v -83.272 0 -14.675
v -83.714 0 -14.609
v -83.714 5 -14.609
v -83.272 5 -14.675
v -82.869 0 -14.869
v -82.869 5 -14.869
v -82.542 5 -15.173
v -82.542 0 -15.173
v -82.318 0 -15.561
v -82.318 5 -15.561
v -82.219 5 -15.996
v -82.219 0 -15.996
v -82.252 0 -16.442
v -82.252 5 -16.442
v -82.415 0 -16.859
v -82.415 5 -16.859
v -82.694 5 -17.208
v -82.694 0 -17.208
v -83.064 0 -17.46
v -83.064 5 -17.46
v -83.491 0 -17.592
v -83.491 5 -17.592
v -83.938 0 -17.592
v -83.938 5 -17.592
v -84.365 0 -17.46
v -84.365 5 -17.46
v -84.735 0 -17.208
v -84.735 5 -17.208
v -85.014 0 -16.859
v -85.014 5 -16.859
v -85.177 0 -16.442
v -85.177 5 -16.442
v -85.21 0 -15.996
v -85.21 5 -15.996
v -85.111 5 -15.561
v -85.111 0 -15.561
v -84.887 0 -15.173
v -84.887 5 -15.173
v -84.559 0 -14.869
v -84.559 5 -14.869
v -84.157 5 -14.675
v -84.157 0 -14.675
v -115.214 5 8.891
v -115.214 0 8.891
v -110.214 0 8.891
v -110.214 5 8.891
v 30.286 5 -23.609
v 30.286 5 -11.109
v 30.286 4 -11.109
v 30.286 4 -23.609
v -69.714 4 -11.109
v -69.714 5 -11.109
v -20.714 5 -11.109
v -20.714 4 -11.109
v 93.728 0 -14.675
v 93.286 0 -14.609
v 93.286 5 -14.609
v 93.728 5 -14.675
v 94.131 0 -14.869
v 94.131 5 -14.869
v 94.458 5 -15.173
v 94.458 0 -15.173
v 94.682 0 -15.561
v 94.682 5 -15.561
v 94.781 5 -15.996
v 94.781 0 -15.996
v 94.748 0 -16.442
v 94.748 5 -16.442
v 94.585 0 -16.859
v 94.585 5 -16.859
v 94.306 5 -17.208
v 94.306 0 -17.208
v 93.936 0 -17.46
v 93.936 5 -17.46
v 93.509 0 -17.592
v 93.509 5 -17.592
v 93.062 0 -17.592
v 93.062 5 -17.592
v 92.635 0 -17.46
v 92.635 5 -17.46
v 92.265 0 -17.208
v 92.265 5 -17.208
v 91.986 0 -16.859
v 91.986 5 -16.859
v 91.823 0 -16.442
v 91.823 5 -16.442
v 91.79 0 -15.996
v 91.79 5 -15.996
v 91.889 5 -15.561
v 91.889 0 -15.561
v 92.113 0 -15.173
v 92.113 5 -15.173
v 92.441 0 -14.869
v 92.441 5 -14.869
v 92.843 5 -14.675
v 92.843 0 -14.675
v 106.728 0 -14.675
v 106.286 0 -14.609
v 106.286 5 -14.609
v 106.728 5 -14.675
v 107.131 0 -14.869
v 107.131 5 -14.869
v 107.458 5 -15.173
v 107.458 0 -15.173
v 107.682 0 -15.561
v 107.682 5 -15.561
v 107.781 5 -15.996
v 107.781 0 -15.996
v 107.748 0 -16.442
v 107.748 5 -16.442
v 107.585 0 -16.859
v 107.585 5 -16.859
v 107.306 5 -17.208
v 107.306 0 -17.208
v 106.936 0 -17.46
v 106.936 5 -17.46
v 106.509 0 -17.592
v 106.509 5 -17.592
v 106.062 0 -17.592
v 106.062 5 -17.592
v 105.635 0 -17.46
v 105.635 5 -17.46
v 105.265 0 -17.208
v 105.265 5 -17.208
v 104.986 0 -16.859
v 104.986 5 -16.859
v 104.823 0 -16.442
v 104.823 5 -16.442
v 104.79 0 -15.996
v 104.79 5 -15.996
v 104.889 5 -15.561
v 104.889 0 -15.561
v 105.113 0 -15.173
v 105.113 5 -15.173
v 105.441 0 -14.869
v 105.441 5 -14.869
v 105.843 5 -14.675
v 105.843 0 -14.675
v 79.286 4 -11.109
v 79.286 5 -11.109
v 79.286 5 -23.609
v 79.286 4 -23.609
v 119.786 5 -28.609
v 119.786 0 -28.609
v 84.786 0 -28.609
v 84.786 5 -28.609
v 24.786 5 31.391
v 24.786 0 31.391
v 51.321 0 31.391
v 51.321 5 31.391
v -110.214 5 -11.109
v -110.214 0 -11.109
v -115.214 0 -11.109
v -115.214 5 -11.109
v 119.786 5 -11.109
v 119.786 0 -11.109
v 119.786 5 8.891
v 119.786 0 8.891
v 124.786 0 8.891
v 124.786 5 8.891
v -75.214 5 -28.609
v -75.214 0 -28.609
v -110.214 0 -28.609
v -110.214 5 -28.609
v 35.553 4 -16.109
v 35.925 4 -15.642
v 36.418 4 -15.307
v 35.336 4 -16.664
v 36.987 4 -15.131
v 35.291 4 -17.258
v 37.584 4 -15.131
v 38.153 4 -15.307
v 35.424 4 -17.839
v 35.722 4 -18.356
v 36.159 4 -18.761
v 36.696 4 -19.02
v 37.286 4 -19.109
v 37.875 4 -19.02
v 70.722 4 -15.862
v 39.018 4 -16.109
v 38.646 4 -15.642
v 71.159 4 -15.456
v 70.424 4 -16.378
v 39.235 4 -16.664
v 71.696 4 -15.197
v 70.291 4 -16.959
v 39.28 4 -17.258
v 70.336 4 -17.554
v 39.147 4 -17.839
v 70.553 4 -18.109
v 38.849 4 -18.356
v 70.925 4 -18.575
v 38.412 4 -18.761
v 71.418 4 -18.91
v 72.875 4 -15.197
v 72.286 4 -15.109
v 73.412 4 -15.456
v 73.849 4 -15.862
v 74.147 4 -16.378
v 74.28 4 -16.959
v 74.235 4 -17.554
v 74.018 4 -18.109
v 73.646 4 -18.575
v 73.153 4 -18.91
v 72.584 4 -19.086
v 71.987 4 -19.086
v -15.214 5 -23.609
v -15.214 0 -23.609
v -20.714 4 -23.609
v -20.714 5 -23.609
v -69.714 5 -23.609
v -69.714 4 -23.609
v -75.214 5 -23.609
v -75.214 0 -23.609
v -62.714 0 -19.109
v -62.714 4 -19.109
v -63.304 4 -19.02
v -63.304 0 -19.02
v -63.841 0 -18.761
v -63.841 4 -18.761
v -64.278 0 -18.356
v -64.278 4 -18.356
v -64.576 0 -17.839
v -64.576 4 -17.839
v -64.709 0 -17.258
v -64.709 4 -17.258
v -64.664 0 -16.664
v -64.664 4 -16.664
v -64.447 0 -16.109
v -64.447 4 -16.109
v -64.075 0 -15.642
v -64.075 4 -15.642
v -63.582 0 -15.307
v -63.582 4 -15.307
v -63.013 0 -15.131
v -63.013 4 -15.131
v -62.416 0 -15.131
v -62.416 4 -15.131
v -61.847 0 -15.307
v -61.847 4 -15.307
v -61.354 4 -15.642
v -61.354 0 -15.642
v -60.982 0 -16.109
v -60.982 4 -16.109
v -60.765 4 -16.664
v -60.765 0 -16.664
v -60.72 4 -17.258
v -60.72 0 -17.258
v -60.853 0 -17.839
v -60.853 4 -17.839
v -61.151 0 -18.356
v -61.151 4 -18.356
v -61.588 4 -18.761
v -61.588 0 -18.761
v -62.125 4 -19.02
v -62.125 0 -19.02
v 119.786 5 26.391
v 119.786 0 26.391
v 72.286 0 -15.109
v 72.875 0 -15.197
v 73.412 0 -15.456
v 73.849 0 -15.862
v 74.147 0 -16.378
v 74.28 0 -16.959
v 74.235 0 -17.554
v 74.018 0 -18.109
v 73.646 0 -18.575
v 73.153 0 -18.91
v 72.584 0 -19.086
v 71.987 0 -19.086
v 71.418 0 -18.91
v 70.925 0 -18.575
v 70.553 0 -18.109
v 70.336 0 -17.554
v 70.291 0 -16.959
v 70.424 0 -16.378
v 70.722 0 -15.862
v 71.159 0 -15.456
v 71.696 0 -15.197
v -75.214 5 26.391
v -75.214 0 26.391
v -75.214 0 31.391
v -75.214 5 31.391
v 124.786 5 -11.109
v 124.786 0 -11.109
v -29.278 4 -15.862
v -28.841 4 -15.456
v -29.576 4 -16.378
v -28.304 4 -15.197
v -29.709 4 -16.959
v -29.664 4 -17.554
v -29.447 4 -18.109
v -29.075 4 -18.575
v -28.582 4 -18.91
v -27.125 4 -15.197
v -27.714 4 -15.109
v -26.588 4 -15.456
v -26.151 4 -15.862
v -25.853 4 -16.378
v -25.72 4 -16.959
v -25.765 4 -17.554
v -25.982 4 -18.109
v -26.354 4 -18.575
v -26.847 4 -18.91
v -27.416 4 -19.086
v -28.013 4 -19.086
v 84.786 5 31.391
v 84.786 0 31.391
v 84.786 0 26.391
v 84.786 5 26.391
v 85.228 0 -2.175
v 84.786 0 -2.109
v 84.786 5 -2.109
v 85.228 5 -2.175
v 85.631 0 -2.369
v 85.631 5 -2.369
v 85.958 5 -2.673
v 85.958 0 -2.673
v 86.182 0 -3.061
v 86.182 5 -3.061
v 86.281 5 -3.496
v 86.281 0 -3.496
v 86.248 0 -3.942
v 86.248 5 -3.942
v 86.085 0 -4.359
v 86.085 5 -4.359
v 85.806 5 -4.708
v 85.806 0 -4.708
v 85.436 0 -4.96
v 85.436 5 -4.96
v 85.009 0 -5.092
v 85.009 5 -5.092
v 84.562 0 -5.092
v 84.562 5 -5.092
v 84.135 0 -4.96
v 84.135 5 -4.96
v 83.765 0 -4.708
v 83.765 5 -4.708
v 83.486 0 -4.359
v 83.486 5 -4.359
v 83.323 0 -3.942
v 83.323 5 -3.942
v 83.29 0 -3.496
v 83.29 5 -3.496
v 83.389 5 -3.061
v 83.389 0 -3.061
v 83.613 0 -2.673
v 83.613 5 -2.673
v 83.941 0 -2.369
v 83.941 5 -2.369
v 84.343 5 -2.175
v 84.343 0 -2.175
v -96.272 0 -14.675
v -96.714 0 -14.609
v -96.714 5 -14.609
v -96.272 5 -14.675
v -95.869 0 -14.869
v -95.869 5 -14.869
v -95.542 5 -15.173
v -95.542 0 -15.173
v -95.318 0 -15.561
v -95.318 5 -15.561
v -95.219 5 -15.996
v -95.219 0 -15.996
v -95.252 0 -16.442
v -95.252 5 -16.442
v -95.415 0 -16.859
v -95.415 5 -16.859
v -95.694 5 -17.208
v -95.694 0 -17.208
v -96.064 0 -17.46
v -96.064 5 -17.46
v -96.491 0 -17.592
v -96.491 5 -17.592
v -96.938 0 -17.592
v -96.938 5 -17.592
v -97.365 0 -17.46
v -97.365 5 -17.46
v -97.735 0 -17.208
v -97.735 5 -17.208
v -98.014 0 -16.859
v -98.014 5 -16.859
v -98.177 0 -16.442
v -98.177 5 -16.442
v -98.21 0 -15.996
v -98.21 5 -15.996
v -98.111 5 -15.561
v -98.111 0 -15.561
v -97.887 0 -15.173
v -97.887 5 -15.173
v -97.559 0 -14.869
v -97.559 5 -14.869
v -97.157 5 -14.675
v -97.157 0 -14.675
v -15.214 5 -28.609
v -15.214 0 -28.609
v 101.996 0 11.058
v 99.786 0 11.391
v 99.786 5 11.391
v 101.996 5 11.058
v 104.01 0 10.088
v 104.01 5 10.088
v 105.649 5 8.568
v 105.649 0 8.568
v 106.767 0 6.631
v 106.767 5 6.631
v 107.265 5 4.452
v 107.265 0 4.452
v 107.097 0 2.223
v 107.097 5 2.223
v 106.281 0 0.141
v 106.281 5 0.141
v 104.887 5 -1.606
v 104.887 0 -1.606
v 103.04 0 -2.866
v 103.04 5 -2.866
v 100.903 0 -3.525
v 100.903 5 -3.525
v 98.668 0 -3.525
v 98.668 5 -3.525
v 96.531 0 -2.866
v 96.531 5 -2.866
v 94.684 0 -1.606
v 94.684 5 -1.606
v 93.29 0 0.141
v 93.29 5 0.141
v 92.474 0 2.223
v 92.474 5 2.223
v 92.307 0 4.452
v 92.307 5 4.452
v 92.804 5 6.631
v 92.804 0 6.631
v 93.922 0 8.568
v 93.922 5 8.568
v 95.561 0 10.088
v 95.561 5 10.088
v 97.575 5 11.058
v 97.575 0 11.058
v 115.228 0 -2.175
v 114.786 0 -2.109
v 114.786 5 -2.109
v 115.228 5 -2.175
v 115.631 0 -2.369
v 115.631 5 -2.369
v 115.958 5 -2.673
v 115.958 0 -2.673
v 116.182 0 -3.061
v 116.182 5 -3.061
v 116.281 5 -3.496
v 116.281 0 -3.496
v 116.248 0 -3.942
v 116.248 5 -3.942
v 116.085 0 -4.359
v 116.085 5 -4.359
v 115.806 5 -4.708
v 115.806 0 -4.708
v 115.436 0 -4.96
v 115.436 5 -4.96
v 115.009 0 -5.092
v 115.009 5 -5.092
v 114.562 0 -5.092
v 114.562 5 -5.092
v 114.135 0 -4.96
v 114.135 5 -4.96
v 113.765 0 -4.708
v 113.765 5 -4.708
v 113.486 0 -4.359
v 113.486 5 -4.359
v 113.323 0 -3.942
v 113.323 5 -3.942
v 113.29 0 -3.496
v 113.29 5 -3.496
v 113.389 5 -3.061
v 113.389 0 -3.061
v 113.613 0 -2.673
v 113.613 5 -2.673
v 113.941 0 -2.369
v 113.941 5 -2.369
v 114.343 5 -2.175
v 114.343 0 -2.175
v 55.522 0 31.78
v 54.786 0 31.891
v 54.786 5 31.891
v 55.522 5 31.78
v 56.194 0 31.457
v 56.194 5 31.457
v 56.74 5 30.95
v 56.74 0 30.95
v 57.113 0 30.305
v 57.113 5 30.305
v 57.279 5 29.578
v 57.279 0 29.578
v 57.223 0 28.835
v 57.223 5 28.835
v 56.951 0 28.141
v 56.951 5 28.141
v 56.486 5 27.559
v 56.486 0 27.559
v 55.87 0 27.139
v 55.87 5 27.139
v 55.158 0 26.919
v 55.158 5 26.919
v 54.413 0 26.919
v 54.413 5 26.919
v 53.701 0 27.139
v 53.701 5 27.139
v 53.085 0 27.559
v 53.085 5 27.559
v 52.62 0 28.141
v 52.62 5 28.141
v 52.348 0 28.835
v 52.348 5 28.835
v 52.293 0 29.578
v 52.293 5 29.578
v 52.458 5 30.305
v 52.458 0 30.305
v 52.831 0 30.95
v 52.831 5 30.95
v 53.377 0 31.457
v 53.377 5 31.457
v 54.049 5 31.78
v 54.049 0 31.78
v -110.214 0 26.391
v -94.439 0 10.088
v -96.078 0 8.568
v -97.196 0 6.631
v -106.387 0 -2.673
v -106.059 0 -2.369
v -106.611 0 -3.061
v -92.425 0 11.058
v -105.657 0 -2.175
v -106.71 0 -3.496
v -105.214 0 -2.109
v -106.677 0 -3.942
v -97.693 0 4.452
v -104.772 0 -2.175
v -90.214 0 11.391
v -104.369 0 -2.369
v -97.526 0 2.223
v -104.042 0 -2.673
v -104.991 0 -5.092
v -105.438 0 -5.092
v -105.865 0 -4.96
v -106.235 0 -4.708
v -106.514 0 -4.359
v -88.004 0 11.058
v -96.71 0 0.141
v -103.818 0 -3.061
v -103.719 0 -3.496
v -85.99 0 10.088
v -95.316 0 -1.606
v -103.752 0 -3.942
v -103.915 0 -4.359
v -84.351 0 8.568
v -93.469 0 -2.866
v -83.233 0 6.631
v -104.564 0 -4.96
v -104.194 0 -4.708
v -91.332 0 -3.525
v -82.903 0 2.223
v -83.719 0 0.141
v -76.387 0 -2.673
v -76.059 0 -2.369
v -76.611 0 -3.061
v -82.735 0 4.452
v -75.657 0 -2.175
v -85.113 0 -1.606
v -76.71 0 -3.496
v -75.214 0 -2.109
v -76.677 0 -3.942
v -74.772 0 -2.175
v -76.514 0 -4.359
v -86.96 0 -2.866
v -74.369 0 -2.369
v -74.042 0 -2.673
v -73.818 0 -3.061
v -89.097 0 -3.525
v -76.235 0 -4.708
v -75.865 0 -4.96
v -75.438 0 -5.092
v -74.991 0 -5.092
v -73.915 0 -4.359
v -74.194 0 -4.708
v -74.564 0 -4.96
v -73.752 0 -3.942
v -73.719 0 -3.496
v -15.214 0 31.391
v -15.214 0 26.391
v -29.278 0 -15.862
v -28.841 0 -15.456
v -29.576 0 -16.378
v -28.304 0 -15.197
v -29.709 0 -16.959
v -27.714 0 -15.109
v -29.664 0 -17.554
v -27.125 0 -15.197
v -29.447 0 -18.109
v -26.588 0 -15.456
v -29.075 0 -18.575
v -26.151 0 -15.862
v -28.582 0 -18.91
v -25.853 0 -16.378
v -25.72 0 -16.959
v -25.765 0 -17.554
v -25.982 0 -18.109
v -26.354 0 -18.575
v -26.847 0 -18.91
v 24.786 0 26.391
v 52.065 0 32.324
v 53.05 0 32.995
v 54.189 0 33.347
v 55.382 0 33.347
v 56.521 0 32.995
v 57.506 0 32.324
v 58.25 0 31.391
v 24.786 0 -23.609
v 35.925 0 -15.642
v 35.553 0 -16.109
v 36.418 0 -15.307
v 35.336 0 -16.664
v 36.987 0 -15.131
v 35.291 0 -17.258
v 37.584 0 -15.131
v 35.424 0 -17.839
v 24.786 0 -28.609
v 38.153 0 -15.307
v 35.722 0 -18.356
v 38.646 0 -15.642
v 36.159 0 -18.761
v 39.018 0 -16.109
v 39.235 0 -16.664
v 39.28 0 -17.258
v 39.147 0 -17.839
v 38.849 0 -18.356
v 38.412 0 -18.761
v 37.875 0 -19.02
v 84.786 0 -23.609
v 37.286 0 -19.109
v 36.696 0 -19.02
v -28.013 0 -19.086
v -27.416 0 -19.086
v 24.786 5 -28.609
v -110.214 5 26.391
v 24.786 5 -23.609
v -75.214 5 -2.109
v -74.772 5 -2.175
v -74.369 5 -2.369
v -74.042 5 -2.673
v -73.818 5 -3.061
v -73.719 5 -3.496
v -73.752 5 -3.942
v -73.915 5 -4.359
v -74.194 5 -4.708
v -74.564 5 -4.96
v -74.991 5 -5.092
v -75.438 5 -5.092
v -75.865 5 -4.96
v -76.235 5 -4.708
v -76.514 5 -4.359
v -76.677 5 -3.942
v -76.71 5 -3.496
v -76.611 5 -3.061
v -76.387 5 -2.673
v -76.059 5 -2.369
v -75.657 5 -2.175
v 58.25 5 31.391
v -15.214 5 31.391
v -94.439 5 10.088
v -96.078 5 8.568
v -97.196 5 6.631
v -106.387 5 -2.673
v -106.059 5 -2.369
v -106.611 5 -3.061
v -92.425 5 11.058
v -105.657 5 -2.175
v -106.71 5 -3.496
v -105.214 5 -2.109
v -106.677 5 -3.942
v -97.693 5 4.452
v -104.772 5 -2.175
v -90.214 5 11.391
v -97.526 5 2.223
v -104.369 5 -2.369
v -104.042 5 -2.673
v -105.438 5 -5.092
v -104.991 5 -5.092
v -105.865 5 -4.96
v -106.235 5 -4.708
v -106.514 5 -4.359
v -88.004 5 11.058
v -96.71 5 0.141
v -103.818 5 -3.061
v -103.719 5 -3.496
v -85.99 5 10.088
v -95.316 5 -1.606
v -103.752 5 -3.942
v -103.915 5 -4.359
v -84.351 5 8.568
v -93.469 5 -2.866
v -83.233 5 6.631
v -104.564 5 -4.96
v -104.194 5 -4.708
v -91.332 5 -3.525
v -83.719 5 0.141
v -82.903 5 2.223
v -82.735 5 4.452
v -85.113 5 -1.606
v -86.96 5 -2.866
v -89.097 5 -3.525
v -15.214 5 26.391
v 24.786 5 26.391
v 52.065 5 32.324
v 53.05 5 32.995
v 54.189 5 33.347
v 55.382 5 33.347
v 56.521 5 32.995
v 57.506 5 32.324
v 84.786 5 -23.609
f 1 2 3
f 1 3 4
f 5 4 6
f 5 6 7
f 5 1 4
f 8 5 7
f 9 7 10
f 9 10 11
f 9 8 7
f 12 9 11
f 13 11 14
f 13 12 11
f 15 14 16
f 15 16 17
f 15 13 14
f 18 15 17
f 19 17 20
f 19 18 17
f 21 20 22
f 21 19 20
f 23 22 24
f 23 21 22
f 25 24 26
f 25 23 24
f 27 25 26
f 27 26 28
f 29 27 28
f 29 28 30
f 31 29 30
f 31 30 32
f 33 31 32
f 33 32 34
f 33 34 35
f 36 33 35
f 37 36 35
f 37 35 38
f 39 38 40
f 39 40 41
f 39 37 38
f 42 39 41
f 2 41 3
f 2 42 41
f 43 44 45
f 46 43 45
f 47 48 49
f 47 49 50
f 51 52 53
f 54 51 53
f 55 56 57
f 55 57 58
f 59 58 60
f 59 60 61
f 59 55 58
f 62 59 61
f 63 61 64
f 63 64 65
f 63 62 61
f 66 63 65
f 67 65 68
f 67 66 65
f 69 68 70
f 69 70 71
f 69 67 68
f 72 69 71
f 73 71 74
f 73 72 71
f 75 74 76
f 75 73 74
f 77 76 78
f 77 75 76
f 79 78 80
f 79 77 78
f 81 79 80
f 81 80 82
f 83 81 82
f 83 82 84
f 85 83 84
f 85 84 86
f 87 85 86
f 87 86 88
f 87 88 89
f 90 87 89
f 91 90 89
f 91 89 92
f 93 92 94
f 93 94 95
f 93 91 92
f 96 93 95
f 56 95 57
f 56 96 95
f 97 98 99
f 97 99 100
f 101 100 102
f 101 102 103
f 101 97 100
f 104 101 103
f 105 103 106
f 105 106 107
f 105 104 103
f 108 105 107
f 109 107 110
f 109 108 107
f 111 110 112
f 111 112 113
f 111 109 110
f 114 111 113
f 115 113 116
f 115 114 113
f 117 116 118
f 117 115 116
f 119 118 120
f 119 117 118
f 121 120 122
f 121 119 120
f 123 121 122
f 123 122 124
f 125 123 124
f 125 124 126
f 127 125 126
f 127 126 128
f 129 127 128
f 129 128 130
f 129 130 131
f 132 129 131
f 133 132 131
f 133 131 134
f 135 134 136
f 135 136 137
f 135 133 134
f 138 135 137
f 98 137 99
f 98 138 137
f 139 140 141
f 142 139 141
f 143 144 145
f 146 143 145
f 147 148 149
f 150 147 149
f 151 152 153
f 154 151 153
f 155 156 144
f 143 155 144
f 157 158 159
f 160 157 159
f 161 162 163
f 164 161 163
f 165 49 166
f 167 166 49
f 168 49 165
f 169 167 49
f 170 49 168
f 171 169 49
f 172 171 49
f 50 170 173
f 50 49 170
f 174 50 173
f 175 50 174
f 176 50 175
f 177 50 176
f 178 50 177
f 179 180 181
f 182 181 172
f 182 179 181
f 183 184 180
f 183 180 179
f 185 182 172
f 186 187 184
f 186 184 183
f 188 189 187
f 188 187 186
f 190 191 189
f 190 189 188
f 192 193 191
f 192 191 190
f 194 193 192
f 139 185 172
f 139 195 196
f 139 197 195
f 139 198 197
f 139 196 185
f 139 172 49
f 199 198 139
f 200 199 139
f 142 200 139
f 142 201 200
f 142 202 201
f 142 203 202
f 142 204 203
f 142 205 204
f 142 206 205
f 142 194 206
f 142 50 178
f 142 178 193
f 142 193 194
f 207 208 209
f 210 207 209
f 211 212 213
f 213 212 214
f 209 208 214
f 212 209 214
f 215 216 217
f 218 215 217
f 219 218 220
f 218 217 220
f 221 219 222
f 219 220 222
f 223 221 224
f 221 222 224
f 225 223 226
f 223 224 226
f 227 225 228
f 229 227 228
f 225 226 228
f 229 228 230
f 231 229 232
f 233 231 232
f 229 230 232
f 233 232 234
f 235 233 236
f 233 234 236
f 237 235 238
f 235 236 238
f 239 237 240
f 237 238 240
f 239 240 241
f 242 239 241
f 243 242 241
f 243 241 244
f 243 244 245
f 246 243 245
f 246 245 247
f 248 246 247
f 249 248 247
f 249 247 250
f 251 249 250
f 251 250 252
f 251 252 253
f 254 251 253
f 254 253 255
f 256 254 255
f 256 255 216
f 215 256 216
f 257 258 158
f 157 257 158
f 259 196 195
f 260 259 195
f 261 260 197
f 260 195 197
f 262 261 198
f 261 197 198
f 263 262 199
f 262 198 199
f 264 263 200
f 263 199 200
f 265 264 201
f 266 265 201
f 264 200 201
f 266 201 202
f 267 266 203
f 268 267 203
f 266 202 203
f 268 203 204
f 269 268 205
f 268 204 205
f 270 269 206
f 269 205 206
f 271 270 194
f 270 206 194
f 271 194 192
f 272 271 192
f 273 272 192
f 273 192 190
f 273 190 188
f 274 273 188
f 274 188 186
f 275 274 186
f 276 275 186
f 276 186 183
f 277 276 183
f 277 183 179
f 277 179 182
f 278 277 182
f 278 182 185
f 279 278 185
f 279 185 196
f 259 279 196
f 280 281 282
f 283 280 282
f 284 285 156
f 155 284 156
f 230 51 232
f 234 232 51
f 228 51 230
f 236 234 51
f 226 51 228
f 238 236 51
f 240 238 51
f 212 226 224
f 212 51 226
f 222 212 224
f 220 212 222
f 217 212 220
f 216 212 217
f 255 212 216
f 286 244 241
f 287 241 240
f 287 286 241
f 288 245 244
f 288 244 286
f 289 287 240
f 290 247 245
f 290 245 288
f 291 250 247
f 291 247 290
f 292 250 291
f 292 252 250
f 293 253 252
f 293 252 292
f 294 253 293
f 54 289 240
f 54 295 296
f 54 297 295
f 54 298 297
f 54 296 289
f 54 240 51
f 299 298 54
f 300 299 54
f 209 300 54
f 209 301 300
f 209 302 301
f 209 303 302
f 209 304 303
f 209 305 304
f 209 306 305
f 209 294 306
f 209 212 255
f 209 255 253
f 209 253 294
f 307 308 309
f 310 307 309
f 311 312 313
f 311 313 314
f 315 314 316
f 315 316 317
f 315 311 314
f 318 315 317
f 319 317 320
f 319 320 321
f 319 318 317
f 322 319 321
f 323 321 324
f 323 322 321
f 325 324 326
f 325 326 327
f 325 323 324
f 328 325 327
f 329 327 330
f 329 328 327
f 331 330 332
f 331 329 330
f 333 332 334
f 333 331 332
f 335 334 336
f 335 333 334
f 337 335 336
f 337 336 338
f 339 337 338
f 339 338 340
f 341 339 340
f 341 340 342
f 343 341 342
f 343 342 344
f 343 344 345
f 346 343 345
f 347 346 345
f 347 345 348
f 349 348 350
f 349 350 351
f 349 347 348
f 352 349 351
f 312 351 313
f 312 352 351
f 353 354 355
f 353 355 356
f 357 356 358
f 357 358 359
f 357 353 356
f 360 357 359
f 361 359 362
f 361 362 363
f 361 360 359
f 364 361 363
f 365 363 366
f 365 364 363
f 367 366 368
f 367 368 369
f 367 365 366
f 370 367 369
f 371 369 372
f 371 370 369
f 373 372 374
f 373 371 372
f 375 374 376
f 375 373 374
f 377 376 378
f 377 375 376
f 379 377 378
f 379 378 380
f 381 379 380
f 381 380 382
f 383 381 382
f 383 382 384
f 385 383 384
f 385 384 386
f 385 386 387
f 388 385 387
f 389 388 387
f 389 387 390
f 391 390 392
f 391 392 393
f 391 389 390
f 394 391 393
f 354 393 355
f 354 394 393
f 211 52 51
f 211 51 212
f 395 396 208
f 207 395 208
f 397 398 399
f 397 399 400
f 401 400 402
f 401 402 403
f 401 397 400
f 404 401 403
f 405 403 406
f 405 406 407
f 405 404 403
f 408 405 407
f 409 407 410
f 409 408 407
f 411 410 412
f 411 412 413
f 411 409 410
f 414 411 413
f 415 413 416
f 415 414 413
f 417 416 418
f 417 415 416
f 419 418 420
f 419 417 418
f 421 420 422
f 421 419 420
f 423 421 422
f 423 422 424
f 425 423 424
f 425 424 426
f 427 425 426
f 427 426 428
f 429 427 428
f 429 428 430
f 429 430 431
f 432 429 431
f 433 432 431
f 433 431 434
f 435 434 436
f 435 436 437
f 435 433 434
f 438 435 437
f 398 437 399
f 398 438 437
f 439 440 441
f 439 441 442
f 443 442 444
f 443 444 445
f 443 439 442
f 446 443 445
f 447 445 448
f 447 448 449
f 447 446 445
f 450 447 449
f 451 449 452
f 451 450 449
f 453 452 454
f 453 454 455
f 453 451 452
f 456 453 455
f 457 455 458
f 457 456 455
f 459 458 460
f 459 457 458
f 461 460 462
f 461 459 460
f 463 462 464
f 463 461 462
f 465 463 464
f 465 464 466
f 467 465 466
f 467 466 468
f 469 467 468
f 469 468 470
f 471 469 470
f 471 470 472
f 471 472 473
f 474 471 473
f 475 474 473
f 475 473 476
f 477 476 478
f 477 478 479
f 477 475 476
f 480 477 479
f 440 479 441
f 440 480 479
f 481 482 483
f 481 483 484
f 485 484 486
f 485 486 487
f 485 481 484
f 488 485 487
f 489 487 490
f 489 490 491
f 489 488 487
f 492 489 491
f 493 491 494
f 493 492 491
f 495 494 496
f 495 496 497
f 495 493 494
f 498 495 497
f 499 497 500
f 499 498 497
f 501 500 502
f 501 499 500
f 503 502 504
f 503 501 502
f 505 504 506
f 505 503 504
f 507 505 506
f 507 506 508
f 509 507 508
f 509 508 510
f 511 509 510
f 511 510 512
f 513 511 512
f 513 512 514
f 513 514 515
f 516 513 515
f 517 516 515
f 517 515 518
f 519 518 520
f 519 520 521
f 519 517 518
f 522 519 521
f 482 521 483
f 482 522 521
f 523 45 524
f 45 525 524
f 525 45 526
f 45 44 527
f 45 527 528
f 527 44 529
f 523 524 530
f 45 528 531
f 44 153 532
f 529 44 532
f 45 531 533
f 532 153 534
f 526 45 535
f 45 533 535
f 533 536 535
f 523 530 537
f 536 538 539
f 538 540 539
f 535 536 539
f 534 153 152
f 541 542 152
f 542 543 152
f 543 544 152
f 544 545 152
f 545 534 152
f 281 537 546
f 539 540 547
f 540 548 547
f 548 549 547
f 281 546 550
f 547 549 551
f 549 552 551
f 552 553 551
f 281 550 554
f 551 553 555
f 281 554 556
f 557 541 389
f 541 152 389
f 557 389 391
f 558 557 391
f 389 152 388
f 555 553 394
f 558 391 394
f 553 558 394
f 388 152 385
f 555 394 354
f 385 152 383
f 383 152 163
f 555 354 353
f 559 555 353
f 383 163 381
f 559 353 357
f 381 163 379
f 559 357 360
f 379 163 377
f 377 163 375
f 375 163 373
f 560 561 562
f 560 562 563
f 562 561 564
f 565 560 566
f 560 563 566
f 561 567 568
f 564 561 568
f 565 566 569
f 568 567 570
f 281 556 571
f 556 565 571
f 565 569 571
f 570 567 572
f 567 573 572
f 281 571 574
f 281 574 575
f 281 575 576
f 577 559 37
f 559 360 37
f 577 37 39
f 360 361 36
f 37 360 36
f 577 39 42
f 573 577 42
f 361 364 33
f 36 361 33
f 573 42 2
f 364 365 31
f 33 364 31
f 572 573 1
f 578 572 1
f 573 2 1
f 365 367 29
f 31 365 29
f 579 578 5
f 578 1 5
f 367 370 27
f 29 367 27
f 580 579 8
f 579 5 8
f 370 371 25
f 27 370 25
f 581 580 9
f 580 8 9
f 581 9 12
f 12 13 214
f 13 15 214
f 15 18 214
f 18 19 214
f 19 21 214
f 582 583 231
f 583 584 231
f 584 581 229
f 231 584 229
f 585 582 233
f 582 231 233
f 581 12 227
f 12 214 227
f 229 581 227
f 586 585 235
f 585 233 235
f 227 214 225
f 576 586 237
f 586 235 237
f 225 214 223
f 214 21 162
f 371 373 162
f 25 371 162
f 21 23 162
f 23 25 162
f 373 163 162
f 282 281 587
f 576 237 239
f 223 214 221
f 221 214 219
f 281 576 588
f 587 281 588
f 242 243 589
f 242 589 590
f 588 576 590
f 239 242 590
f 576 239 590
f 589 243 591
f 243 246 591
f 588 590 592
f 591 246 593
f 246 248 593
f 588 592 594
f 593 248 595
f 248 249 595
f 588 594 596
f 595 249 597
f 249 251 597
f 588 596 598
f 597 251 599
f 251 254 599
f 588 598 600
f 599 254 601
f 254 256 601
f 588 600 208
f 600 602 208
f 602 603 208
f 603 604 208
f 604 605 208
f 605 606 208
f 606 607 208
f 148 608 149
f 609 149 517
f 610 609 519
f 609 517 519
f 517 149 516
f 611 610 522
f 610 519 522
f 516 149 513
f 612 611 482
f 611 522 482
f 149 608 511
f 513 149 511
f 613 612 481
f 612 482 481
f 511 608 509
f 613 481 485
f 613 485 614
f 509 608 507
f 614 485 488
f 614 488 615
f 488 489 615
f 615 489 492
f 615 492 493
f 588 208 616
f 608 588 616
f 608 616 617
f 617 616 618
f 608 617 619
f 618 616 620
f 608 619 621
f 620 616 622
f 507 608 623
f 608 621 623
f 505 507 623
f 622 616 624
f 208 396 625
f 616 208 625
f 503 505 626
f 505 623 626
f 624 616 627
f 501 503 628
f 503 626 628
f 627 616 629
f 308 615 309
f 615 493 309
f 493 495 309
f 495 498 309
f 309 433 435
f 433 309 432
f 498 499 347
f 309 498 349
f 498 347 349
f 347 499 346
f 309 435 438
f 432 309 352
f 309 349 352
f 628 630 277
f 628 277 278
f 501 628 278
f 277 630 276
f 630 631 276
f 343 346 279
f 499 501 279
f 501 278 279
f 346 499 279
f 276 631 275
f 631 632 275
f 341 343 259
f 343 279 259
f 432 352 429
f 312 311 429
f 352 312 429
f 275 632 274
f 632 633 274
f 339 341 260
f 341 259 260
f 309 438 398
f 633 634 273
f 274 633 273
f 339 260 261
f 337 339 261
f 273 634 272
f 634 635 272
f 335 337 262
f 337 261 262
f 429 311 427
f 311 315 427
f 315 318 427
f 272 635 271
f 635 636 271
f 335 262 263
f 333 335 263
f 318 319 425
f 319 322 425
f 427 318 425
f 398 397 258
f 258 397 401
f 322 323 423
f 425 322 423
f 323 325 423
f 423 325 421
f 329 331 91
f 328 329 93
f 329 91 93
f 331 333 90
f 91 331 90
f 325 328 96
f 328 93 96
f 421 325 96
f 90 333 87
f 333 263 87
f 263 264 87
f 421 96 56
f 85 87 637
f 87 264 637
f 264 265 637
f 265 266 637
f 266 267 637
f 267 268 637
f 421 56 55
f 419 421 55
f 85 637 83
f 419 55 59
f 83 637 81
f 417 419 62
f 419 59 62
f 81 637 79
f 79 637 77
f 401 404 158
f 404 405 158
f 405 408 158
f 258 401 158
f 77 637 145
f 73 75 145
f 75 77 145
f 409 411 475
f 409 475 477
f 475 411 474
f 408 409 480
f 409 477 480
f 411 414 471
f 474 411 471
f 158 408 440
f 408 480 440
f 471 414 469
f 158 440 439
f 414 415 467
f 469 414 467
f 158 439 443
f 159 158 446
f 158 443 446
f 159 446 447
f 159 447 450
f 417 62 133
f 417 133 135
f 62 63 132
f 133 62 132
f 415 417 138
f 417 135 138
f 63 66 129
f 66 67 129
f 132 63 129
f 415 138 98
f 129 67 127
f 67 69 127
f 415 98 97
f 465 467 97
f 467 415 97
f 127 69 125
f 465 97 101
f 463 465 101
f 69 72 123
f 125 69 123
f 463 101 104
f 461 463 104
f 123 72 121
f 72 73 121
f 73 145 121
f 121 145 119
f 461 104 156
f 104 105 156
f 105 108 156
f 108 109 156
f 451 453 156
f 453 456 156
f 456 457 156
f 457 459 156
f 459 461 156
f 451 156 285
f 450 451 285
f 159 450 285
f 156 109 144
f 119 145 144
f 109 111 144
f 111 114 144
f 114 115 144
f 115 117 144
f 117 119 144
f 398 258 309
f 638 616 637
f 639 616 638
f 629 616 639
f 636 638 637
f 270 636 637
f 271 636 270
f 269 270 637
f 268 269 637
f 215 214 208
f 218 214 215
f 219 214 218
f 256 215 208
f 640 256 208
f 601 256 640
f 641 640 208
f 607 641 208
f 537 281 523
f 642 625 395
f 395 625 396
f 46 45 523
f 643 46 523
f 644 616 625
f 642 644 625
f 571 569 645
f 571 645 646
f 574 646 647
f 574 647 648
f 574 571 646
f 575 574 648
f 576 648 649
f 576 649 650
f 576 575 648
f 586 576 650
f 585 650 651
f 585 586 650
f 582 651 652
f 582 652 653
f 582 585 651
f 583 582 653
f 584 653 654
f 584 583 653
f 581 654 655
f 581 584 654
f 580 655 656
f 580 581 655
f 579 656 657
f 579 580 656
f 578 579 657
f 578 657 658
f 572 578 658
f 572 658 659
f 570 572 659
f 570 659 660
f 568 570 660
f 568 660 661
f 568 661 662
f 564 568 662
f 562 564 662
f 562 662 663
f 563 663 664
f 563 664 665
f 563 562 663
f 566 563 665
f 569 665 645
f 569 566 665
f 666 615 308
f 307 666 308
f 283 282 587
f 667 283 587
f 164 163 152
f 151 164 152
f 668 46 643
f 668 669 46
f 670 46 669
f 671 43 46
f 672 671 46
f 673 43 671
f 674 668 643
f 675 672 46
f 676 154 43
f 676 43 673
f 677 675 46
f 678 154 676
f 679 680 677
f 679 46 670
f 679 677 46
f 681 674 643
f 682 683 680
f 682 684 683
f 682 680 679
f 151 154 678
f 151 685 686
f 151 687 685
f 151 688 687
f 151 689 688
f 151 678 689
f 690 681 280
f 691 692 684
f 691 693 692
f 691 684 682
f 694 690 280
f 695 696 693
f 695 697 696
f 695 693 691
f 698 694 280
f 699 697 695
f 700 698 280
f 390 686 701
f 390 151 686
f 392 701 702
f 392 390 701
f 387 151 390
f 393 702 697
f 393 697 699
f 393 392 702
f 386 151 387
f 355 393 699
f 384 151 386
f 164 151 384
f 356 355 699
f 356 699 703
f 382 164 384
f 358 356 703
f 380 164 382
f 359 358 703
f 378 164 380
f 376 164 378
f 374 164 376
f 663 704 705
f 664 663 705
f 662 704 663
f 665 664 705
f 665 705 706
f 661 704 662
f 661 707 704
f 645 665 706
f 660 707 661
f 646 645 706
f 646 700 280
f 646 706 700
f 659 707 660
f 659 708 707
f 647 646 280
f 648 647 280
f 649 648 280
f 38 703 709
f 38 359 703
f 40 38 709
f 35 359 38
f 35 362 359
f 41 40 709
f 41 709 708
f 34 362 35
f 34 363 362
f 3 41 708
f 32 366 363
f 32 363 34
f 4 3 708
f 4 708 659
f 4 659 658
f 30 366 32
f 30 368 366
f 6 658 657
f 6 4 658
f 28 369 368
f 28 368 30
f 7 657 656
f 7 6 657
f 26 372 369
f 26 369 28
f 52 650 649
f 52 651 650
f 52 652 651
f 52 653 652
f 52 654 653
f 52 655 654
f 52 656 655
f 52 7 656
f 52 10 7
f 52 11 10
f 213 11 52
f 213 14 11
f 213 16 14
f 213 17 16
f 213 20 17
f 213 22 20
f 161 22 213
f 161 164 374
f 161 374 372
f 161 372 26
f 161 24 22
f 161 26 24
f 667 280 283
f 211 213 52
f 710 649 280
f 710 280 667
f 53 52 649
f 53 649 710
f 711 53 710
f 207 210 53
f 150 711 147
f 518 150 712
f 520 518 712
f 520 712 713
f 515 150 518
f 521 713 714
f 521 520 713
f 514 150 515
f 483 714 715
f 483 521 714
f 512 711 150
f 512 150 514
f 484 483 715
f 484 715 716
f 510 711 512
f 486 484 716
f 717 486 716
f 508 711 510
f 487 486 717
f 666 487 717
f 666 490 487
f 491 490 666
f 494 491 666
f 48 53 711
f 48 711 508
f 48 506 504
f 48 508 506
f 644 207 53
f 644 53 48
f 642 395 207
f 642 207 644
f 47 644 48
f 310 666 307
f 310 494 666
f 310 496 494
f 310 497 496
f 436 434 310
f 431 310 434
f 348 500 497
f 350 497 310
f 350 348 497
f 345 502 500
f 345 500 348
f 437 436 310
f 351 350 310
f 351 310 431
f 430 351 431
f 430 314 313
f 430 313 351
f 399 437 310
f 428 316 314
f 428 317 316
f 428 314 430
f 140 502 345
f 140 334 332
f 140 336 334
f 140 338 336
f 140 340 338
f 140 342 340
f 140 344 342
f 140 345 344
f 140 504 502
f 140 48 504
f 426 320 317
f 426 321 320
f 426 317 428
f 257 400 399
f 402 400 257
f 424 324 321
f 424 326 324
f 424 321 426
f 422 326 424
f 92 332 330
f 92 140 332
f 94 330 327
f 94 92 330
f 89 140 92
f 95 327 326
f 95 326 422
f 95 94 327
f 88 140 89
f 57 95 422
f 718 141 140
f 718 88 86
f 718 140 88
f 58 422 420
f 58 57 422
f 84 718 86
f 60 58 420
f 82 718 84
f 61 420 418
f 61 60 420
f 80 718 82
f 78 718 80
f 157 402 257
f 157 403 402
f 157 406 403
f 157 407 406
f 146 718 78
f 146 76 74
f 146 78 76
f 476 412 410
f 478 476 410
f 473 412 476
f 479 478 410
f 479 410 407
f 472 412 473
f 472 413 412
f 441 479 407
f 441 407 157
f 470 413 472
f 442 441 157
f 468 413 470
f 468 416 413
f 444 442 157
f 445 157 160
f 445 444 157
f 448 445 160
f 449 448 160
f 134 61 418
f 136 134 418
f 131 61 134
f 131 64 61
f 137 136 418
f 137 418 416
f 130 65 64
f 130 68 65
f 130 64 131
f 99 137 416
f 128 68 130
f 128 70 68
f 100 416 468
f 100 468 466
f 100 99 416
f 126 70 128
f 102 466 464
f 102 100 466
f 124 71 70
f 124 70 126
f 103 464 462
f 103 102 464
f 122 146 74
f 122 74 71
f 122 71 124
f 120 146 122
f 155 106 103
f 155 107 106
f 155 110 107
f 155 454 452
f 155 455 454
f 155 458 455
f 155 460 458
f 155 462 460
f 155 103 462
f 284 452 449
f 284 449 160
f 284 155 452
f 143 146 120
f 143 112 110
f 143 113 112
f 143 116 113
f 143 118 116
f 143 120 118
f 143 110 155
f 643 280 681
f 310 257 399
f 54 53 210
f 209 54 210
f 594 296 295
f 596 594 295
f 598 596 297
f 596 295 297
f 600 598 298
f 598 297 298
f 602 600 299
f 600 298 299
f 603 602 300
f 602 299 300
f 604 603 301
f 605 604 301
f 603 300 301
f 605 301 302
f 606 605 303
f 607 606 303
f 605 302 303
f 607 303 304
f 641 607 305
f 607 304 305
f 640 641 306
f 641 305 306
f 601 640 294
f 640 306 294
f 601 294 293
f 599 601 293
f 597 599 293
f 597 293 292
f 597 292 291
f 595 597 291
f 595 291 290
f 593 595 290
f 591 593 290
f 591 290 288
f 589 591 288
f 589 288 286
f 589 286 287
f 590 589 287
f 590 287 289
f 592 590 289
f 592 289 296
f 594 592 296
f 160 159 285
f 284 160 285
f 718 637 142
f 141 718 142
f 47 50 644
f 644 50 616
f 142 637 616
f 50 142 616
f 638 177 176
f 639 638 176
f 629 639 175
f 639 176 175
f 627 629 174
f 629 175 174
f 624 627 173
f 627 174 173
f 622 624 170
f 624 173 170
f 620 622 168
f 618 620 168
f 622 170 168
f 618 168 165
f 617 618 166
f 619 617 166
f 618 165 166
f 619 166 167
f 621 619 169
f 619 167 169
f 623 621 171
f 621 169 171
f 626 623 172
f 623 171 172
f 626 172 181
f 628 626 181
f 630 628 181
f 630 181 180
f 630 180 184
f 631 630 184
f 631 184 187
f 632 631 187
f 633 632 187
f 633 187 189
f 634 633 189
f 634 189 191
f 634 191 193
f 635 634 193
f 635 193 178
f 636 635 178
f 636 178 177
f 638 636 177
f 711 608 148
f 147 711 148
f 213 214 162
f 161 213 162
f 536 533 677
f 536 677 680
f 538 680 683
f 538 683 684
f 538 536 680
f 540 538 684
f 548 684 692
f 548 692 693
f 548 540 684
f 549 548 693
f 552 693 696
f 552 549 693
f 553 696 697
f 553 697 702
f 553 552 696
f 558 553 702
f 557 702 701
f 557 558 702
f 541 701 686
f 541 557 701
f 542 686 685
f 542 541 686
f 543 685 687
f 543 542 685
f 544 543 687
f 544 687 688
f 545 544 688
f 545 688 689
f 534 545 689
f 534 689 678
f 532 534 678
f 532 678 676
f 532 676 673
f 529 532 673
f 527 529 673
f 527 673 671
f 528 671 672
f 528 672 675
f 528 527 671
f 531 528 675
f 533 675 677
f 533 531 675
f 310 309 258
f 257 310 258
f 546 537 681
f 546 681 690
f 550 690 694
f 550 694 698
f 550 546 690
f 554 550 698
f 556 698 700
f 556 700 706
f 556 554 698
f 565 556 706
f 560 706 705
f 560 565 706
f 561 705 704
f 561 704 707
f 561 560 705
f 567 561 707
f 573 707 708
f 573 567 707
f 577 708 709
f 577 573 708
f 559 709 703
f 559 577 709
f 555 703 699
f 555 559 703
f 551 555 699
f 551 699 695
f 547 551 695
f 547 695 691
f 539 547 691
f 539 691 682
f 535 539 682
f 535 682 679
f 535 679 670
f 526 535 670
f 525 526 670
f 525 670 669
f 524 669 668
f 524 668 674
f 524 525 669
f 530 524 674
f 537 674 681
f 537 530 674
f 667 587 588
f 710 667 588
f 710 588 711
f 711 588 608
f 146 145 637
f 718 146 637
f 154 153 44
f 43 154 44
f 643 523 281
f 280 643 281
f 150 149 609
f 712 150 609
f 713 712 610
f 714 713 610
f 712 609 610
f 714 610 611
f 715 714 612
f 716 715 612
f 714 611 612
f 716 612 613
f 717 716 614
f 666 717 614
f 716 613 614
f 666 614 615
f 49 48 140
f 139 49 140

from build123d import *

# Parameters (mm, degrees)
ESQUISSE2_R             = 2.5
ESQUISSE2_R_2           = 7.5
ESQUISSE2_R_3           = 1.5
BOSS_EXTRU_5_DEPTH      = 5
ESQUISSE3_W             = 49
ESQUISSE3_H             = 12.5
ENL_V_MAT_EXTRU_1_DEPTH = 1
ESQUISSE4_R             = 2
ENL_V_MAT_EXTRU_2_DEPTH = 130.272649712


with BuildPart() as part:
    # Esquisse2 → Boss.-Extru.5 (new body)
    with BuildSketch(Plane(origin=(0, 0, 0), x_dir=(1, 0, 0), z_dir=(0, 1, 0))):
        with BuildLine():
            Line((-75.214465703, -26.391441925), (-75.214465703, -31.391441925))
            Line((-75.214465703, -31.391441925), (-15.214465703, -31.391441925))
            Line((-15.214465703, -31.391441925), (-15.214465703, -26.391441925))
            Line((-15.214465703, -26.391441925), (24.785534297, -26.391441925))
            Line((24.785534297, -26.391441925), (24.785534297, -31.391441925))
            Line((24.785534297, -31.391441925), (51.321432682, -31.391441925))
            ThreePointArc((51.321432682, -31.391441925), (54.785534297, -33.391441925), (58.249635912, -31.391441925))
            Line((58.249635912, -31.391441925), (84.785534297, -31.391441925))
            Line((84.785534297, -31.391441925), (84.785534297, -26.391441925))
            Line((84.785534297, -26.391441925), (119.785534297, -26.391441925))
            Line((119.785534297, -26.391441925), (119.785534297, -8.891441925))
            Line((119.785534297, -8.891441925), (124.785534297, -8.891441925))
            Line((124.785534297, -8.891441925), (124.785534297, 11.108558075))
            Line((124.785534297, 11.108558075), (119.785534297, 11.108558075))
            Line((119.785534297, 11.108558075), (119.785534297, 28.608558075))
            Line((119.785534297, 28.608558075), (84.785534297, 28.608558075))
            Line((84.785534297, 28.608558075), (84.785534297, 23.608558075))
            Line((84.785534297, 23.608558075), (24.785534297, 23.608558075))
            Line((24.785534297, 23.608558075), (24.785534297, 28.608558075))
            Line((24.785534297, 28.608558075), (-15.214465703, 28.608558075))
            Line((-15.214465703, 28.608558075), (-15.214465703, 23.608558075))
            Line((-15.214465703, 23.608558075), (-75.214465703, 23.608558075))
            Line((-75.214465703, 23.608558075), (-75.214465703, 28.608558075))
            Line((-75.214465703, 28.608558075), (-110.214465703, 28.608558075))
            Line((-110.214465703, 28.608558075), (-110.214465703, 11.108558075))
            Line((-110.214465703, 11.108558075), (-115.214465703, 11.108558075))
            Line((-115.214465703, 11.108558075), (-115.214465703, -8.891441925))
            Line((-115.214465703, -8.891441925), (-110.214465703, -8.891441925))
            Line((-110.214465703, -8.891441925), (-110.214465703, -26.391441925))
            Line((-110.214465703, -26.391441925), (-75.214465703, -26.391441925))
        make_face()
        with Locations(Location((54.785534297, -29.391441925, 0), (0, 0, 270))):
            Circle(ESQUISSE2_R, mode=Mode.SUBTRACT)
        with Locations(Location((-90.214465703, -3.891441925, 0), (0, 0, 270))):
            Circle(ESQUISSE2_R_2, mode=Mode.SUBTRACT)
        with Locations(Location((99.785534297, -3.891441925, 0), (0, 0, 270))):
            Circle(ESQUISSE2_R_2, mode=Mode.SUBTRACT)
        with Locations(Location((-105.214465703, 3.608558075, 0), (0, 0, 270))):
            Circle(ESQUISSE2_R_3, mode=Mode.SUBTRACT)
        with Locations(Location((-75.214465703, 3.608558075, 0), (0, 0, 270))):
            Circle(ESQUISSE2_R_3, mode=Mode.SUBTRACT)
        with Locations(Location((-96.714465703, 16.108558075, 0), (0, 0, 270))):
            Circle(ESQUISSE2_R_3, mode=Mode.SUBTRACT)
        with Locations(Location((-83.714465703, 16.108558075, 0), (0, 0, 270))):
            Circle(ESQUISSE2_R_3, mode=Mode.SUBTRACT)
        with Locations(Location((84.785534297, 3.608558075, 0), (0, 0, 270))):
            Circle(ESQUISSE2_R_3, mode=Mode.SUBTRACT)
        with Locations(Location((114.785534297, 3.608558075, 0), (0, 0, 270))):
            Circle(ESQUISSE2_R_3, mode=Mode.SUBTRACT)
        with Locations(Location((93.285534297, 16.108558075, 0), (0, 0, 270))):
            Circle(ESQUISSE2_R_3, mode=Mode.SUBTRACT)
        with Locations(Location((106.285534297, 16.108558075, 0), (0, 0, 270))):
            Circle(ESQUISSE2_R_3, mode=Mode.SUBTRACT)
    extrude(amount=BOSS_EXTRU_5_DEPTH)

    # Esquisse3 → Enlèv. mat.-Extru.1 (cut)
    with BuildSketch(Plane(origin=(0, 5, 0), x_dir=(1, 0, 0), z_dir=(0, 1, 0))):
        with Locations((54.785534297, 17.358558075)):
            Rectangle(ESQUISSE3_W, ESQUISSE3_H)
        with Locations((-45.214465703, 17.358558075)):
            Rectangle(ESQUISSE3_W, ESQUISSE3_H)
    extrude(amount=-ENL_V_MAT_EXTRU_1_DEPTH, mode=Mode.SUBTRACT)

    # Esquisse4 → Enlèv. mat.-Extru.2 (cut, through all)
    with BuildSketch(Plane(origin=(0, 5, 0), x_dir=(1, 0, 0), z_dir=(0, 1, 0))):
        with Locations(Location((72.285534297, 17.108558075, 0), (0, 0, 270))):
            Circle(ESQUISSE4_R)
        with Locations(Location((37.285534297, 17.108558075, 0), (0, 0, 90))):
            Circle(ESQUISSE4_R)
        with Locations(Location((-27.714465703, 17.108558075, 0), (0, 0, 270))):
            Circle(ESQUISSE4_R)
        with Locations(Location((-62.714465703, 17.108558075, 0), (0, 0, 90))):
            Circle(ESQUISSE4_R)
    extrude(amount=-ENL_V_MAT_EXTRU_2_DEPTH, mode=Mode.SUBTRACT)


solid = part.part
